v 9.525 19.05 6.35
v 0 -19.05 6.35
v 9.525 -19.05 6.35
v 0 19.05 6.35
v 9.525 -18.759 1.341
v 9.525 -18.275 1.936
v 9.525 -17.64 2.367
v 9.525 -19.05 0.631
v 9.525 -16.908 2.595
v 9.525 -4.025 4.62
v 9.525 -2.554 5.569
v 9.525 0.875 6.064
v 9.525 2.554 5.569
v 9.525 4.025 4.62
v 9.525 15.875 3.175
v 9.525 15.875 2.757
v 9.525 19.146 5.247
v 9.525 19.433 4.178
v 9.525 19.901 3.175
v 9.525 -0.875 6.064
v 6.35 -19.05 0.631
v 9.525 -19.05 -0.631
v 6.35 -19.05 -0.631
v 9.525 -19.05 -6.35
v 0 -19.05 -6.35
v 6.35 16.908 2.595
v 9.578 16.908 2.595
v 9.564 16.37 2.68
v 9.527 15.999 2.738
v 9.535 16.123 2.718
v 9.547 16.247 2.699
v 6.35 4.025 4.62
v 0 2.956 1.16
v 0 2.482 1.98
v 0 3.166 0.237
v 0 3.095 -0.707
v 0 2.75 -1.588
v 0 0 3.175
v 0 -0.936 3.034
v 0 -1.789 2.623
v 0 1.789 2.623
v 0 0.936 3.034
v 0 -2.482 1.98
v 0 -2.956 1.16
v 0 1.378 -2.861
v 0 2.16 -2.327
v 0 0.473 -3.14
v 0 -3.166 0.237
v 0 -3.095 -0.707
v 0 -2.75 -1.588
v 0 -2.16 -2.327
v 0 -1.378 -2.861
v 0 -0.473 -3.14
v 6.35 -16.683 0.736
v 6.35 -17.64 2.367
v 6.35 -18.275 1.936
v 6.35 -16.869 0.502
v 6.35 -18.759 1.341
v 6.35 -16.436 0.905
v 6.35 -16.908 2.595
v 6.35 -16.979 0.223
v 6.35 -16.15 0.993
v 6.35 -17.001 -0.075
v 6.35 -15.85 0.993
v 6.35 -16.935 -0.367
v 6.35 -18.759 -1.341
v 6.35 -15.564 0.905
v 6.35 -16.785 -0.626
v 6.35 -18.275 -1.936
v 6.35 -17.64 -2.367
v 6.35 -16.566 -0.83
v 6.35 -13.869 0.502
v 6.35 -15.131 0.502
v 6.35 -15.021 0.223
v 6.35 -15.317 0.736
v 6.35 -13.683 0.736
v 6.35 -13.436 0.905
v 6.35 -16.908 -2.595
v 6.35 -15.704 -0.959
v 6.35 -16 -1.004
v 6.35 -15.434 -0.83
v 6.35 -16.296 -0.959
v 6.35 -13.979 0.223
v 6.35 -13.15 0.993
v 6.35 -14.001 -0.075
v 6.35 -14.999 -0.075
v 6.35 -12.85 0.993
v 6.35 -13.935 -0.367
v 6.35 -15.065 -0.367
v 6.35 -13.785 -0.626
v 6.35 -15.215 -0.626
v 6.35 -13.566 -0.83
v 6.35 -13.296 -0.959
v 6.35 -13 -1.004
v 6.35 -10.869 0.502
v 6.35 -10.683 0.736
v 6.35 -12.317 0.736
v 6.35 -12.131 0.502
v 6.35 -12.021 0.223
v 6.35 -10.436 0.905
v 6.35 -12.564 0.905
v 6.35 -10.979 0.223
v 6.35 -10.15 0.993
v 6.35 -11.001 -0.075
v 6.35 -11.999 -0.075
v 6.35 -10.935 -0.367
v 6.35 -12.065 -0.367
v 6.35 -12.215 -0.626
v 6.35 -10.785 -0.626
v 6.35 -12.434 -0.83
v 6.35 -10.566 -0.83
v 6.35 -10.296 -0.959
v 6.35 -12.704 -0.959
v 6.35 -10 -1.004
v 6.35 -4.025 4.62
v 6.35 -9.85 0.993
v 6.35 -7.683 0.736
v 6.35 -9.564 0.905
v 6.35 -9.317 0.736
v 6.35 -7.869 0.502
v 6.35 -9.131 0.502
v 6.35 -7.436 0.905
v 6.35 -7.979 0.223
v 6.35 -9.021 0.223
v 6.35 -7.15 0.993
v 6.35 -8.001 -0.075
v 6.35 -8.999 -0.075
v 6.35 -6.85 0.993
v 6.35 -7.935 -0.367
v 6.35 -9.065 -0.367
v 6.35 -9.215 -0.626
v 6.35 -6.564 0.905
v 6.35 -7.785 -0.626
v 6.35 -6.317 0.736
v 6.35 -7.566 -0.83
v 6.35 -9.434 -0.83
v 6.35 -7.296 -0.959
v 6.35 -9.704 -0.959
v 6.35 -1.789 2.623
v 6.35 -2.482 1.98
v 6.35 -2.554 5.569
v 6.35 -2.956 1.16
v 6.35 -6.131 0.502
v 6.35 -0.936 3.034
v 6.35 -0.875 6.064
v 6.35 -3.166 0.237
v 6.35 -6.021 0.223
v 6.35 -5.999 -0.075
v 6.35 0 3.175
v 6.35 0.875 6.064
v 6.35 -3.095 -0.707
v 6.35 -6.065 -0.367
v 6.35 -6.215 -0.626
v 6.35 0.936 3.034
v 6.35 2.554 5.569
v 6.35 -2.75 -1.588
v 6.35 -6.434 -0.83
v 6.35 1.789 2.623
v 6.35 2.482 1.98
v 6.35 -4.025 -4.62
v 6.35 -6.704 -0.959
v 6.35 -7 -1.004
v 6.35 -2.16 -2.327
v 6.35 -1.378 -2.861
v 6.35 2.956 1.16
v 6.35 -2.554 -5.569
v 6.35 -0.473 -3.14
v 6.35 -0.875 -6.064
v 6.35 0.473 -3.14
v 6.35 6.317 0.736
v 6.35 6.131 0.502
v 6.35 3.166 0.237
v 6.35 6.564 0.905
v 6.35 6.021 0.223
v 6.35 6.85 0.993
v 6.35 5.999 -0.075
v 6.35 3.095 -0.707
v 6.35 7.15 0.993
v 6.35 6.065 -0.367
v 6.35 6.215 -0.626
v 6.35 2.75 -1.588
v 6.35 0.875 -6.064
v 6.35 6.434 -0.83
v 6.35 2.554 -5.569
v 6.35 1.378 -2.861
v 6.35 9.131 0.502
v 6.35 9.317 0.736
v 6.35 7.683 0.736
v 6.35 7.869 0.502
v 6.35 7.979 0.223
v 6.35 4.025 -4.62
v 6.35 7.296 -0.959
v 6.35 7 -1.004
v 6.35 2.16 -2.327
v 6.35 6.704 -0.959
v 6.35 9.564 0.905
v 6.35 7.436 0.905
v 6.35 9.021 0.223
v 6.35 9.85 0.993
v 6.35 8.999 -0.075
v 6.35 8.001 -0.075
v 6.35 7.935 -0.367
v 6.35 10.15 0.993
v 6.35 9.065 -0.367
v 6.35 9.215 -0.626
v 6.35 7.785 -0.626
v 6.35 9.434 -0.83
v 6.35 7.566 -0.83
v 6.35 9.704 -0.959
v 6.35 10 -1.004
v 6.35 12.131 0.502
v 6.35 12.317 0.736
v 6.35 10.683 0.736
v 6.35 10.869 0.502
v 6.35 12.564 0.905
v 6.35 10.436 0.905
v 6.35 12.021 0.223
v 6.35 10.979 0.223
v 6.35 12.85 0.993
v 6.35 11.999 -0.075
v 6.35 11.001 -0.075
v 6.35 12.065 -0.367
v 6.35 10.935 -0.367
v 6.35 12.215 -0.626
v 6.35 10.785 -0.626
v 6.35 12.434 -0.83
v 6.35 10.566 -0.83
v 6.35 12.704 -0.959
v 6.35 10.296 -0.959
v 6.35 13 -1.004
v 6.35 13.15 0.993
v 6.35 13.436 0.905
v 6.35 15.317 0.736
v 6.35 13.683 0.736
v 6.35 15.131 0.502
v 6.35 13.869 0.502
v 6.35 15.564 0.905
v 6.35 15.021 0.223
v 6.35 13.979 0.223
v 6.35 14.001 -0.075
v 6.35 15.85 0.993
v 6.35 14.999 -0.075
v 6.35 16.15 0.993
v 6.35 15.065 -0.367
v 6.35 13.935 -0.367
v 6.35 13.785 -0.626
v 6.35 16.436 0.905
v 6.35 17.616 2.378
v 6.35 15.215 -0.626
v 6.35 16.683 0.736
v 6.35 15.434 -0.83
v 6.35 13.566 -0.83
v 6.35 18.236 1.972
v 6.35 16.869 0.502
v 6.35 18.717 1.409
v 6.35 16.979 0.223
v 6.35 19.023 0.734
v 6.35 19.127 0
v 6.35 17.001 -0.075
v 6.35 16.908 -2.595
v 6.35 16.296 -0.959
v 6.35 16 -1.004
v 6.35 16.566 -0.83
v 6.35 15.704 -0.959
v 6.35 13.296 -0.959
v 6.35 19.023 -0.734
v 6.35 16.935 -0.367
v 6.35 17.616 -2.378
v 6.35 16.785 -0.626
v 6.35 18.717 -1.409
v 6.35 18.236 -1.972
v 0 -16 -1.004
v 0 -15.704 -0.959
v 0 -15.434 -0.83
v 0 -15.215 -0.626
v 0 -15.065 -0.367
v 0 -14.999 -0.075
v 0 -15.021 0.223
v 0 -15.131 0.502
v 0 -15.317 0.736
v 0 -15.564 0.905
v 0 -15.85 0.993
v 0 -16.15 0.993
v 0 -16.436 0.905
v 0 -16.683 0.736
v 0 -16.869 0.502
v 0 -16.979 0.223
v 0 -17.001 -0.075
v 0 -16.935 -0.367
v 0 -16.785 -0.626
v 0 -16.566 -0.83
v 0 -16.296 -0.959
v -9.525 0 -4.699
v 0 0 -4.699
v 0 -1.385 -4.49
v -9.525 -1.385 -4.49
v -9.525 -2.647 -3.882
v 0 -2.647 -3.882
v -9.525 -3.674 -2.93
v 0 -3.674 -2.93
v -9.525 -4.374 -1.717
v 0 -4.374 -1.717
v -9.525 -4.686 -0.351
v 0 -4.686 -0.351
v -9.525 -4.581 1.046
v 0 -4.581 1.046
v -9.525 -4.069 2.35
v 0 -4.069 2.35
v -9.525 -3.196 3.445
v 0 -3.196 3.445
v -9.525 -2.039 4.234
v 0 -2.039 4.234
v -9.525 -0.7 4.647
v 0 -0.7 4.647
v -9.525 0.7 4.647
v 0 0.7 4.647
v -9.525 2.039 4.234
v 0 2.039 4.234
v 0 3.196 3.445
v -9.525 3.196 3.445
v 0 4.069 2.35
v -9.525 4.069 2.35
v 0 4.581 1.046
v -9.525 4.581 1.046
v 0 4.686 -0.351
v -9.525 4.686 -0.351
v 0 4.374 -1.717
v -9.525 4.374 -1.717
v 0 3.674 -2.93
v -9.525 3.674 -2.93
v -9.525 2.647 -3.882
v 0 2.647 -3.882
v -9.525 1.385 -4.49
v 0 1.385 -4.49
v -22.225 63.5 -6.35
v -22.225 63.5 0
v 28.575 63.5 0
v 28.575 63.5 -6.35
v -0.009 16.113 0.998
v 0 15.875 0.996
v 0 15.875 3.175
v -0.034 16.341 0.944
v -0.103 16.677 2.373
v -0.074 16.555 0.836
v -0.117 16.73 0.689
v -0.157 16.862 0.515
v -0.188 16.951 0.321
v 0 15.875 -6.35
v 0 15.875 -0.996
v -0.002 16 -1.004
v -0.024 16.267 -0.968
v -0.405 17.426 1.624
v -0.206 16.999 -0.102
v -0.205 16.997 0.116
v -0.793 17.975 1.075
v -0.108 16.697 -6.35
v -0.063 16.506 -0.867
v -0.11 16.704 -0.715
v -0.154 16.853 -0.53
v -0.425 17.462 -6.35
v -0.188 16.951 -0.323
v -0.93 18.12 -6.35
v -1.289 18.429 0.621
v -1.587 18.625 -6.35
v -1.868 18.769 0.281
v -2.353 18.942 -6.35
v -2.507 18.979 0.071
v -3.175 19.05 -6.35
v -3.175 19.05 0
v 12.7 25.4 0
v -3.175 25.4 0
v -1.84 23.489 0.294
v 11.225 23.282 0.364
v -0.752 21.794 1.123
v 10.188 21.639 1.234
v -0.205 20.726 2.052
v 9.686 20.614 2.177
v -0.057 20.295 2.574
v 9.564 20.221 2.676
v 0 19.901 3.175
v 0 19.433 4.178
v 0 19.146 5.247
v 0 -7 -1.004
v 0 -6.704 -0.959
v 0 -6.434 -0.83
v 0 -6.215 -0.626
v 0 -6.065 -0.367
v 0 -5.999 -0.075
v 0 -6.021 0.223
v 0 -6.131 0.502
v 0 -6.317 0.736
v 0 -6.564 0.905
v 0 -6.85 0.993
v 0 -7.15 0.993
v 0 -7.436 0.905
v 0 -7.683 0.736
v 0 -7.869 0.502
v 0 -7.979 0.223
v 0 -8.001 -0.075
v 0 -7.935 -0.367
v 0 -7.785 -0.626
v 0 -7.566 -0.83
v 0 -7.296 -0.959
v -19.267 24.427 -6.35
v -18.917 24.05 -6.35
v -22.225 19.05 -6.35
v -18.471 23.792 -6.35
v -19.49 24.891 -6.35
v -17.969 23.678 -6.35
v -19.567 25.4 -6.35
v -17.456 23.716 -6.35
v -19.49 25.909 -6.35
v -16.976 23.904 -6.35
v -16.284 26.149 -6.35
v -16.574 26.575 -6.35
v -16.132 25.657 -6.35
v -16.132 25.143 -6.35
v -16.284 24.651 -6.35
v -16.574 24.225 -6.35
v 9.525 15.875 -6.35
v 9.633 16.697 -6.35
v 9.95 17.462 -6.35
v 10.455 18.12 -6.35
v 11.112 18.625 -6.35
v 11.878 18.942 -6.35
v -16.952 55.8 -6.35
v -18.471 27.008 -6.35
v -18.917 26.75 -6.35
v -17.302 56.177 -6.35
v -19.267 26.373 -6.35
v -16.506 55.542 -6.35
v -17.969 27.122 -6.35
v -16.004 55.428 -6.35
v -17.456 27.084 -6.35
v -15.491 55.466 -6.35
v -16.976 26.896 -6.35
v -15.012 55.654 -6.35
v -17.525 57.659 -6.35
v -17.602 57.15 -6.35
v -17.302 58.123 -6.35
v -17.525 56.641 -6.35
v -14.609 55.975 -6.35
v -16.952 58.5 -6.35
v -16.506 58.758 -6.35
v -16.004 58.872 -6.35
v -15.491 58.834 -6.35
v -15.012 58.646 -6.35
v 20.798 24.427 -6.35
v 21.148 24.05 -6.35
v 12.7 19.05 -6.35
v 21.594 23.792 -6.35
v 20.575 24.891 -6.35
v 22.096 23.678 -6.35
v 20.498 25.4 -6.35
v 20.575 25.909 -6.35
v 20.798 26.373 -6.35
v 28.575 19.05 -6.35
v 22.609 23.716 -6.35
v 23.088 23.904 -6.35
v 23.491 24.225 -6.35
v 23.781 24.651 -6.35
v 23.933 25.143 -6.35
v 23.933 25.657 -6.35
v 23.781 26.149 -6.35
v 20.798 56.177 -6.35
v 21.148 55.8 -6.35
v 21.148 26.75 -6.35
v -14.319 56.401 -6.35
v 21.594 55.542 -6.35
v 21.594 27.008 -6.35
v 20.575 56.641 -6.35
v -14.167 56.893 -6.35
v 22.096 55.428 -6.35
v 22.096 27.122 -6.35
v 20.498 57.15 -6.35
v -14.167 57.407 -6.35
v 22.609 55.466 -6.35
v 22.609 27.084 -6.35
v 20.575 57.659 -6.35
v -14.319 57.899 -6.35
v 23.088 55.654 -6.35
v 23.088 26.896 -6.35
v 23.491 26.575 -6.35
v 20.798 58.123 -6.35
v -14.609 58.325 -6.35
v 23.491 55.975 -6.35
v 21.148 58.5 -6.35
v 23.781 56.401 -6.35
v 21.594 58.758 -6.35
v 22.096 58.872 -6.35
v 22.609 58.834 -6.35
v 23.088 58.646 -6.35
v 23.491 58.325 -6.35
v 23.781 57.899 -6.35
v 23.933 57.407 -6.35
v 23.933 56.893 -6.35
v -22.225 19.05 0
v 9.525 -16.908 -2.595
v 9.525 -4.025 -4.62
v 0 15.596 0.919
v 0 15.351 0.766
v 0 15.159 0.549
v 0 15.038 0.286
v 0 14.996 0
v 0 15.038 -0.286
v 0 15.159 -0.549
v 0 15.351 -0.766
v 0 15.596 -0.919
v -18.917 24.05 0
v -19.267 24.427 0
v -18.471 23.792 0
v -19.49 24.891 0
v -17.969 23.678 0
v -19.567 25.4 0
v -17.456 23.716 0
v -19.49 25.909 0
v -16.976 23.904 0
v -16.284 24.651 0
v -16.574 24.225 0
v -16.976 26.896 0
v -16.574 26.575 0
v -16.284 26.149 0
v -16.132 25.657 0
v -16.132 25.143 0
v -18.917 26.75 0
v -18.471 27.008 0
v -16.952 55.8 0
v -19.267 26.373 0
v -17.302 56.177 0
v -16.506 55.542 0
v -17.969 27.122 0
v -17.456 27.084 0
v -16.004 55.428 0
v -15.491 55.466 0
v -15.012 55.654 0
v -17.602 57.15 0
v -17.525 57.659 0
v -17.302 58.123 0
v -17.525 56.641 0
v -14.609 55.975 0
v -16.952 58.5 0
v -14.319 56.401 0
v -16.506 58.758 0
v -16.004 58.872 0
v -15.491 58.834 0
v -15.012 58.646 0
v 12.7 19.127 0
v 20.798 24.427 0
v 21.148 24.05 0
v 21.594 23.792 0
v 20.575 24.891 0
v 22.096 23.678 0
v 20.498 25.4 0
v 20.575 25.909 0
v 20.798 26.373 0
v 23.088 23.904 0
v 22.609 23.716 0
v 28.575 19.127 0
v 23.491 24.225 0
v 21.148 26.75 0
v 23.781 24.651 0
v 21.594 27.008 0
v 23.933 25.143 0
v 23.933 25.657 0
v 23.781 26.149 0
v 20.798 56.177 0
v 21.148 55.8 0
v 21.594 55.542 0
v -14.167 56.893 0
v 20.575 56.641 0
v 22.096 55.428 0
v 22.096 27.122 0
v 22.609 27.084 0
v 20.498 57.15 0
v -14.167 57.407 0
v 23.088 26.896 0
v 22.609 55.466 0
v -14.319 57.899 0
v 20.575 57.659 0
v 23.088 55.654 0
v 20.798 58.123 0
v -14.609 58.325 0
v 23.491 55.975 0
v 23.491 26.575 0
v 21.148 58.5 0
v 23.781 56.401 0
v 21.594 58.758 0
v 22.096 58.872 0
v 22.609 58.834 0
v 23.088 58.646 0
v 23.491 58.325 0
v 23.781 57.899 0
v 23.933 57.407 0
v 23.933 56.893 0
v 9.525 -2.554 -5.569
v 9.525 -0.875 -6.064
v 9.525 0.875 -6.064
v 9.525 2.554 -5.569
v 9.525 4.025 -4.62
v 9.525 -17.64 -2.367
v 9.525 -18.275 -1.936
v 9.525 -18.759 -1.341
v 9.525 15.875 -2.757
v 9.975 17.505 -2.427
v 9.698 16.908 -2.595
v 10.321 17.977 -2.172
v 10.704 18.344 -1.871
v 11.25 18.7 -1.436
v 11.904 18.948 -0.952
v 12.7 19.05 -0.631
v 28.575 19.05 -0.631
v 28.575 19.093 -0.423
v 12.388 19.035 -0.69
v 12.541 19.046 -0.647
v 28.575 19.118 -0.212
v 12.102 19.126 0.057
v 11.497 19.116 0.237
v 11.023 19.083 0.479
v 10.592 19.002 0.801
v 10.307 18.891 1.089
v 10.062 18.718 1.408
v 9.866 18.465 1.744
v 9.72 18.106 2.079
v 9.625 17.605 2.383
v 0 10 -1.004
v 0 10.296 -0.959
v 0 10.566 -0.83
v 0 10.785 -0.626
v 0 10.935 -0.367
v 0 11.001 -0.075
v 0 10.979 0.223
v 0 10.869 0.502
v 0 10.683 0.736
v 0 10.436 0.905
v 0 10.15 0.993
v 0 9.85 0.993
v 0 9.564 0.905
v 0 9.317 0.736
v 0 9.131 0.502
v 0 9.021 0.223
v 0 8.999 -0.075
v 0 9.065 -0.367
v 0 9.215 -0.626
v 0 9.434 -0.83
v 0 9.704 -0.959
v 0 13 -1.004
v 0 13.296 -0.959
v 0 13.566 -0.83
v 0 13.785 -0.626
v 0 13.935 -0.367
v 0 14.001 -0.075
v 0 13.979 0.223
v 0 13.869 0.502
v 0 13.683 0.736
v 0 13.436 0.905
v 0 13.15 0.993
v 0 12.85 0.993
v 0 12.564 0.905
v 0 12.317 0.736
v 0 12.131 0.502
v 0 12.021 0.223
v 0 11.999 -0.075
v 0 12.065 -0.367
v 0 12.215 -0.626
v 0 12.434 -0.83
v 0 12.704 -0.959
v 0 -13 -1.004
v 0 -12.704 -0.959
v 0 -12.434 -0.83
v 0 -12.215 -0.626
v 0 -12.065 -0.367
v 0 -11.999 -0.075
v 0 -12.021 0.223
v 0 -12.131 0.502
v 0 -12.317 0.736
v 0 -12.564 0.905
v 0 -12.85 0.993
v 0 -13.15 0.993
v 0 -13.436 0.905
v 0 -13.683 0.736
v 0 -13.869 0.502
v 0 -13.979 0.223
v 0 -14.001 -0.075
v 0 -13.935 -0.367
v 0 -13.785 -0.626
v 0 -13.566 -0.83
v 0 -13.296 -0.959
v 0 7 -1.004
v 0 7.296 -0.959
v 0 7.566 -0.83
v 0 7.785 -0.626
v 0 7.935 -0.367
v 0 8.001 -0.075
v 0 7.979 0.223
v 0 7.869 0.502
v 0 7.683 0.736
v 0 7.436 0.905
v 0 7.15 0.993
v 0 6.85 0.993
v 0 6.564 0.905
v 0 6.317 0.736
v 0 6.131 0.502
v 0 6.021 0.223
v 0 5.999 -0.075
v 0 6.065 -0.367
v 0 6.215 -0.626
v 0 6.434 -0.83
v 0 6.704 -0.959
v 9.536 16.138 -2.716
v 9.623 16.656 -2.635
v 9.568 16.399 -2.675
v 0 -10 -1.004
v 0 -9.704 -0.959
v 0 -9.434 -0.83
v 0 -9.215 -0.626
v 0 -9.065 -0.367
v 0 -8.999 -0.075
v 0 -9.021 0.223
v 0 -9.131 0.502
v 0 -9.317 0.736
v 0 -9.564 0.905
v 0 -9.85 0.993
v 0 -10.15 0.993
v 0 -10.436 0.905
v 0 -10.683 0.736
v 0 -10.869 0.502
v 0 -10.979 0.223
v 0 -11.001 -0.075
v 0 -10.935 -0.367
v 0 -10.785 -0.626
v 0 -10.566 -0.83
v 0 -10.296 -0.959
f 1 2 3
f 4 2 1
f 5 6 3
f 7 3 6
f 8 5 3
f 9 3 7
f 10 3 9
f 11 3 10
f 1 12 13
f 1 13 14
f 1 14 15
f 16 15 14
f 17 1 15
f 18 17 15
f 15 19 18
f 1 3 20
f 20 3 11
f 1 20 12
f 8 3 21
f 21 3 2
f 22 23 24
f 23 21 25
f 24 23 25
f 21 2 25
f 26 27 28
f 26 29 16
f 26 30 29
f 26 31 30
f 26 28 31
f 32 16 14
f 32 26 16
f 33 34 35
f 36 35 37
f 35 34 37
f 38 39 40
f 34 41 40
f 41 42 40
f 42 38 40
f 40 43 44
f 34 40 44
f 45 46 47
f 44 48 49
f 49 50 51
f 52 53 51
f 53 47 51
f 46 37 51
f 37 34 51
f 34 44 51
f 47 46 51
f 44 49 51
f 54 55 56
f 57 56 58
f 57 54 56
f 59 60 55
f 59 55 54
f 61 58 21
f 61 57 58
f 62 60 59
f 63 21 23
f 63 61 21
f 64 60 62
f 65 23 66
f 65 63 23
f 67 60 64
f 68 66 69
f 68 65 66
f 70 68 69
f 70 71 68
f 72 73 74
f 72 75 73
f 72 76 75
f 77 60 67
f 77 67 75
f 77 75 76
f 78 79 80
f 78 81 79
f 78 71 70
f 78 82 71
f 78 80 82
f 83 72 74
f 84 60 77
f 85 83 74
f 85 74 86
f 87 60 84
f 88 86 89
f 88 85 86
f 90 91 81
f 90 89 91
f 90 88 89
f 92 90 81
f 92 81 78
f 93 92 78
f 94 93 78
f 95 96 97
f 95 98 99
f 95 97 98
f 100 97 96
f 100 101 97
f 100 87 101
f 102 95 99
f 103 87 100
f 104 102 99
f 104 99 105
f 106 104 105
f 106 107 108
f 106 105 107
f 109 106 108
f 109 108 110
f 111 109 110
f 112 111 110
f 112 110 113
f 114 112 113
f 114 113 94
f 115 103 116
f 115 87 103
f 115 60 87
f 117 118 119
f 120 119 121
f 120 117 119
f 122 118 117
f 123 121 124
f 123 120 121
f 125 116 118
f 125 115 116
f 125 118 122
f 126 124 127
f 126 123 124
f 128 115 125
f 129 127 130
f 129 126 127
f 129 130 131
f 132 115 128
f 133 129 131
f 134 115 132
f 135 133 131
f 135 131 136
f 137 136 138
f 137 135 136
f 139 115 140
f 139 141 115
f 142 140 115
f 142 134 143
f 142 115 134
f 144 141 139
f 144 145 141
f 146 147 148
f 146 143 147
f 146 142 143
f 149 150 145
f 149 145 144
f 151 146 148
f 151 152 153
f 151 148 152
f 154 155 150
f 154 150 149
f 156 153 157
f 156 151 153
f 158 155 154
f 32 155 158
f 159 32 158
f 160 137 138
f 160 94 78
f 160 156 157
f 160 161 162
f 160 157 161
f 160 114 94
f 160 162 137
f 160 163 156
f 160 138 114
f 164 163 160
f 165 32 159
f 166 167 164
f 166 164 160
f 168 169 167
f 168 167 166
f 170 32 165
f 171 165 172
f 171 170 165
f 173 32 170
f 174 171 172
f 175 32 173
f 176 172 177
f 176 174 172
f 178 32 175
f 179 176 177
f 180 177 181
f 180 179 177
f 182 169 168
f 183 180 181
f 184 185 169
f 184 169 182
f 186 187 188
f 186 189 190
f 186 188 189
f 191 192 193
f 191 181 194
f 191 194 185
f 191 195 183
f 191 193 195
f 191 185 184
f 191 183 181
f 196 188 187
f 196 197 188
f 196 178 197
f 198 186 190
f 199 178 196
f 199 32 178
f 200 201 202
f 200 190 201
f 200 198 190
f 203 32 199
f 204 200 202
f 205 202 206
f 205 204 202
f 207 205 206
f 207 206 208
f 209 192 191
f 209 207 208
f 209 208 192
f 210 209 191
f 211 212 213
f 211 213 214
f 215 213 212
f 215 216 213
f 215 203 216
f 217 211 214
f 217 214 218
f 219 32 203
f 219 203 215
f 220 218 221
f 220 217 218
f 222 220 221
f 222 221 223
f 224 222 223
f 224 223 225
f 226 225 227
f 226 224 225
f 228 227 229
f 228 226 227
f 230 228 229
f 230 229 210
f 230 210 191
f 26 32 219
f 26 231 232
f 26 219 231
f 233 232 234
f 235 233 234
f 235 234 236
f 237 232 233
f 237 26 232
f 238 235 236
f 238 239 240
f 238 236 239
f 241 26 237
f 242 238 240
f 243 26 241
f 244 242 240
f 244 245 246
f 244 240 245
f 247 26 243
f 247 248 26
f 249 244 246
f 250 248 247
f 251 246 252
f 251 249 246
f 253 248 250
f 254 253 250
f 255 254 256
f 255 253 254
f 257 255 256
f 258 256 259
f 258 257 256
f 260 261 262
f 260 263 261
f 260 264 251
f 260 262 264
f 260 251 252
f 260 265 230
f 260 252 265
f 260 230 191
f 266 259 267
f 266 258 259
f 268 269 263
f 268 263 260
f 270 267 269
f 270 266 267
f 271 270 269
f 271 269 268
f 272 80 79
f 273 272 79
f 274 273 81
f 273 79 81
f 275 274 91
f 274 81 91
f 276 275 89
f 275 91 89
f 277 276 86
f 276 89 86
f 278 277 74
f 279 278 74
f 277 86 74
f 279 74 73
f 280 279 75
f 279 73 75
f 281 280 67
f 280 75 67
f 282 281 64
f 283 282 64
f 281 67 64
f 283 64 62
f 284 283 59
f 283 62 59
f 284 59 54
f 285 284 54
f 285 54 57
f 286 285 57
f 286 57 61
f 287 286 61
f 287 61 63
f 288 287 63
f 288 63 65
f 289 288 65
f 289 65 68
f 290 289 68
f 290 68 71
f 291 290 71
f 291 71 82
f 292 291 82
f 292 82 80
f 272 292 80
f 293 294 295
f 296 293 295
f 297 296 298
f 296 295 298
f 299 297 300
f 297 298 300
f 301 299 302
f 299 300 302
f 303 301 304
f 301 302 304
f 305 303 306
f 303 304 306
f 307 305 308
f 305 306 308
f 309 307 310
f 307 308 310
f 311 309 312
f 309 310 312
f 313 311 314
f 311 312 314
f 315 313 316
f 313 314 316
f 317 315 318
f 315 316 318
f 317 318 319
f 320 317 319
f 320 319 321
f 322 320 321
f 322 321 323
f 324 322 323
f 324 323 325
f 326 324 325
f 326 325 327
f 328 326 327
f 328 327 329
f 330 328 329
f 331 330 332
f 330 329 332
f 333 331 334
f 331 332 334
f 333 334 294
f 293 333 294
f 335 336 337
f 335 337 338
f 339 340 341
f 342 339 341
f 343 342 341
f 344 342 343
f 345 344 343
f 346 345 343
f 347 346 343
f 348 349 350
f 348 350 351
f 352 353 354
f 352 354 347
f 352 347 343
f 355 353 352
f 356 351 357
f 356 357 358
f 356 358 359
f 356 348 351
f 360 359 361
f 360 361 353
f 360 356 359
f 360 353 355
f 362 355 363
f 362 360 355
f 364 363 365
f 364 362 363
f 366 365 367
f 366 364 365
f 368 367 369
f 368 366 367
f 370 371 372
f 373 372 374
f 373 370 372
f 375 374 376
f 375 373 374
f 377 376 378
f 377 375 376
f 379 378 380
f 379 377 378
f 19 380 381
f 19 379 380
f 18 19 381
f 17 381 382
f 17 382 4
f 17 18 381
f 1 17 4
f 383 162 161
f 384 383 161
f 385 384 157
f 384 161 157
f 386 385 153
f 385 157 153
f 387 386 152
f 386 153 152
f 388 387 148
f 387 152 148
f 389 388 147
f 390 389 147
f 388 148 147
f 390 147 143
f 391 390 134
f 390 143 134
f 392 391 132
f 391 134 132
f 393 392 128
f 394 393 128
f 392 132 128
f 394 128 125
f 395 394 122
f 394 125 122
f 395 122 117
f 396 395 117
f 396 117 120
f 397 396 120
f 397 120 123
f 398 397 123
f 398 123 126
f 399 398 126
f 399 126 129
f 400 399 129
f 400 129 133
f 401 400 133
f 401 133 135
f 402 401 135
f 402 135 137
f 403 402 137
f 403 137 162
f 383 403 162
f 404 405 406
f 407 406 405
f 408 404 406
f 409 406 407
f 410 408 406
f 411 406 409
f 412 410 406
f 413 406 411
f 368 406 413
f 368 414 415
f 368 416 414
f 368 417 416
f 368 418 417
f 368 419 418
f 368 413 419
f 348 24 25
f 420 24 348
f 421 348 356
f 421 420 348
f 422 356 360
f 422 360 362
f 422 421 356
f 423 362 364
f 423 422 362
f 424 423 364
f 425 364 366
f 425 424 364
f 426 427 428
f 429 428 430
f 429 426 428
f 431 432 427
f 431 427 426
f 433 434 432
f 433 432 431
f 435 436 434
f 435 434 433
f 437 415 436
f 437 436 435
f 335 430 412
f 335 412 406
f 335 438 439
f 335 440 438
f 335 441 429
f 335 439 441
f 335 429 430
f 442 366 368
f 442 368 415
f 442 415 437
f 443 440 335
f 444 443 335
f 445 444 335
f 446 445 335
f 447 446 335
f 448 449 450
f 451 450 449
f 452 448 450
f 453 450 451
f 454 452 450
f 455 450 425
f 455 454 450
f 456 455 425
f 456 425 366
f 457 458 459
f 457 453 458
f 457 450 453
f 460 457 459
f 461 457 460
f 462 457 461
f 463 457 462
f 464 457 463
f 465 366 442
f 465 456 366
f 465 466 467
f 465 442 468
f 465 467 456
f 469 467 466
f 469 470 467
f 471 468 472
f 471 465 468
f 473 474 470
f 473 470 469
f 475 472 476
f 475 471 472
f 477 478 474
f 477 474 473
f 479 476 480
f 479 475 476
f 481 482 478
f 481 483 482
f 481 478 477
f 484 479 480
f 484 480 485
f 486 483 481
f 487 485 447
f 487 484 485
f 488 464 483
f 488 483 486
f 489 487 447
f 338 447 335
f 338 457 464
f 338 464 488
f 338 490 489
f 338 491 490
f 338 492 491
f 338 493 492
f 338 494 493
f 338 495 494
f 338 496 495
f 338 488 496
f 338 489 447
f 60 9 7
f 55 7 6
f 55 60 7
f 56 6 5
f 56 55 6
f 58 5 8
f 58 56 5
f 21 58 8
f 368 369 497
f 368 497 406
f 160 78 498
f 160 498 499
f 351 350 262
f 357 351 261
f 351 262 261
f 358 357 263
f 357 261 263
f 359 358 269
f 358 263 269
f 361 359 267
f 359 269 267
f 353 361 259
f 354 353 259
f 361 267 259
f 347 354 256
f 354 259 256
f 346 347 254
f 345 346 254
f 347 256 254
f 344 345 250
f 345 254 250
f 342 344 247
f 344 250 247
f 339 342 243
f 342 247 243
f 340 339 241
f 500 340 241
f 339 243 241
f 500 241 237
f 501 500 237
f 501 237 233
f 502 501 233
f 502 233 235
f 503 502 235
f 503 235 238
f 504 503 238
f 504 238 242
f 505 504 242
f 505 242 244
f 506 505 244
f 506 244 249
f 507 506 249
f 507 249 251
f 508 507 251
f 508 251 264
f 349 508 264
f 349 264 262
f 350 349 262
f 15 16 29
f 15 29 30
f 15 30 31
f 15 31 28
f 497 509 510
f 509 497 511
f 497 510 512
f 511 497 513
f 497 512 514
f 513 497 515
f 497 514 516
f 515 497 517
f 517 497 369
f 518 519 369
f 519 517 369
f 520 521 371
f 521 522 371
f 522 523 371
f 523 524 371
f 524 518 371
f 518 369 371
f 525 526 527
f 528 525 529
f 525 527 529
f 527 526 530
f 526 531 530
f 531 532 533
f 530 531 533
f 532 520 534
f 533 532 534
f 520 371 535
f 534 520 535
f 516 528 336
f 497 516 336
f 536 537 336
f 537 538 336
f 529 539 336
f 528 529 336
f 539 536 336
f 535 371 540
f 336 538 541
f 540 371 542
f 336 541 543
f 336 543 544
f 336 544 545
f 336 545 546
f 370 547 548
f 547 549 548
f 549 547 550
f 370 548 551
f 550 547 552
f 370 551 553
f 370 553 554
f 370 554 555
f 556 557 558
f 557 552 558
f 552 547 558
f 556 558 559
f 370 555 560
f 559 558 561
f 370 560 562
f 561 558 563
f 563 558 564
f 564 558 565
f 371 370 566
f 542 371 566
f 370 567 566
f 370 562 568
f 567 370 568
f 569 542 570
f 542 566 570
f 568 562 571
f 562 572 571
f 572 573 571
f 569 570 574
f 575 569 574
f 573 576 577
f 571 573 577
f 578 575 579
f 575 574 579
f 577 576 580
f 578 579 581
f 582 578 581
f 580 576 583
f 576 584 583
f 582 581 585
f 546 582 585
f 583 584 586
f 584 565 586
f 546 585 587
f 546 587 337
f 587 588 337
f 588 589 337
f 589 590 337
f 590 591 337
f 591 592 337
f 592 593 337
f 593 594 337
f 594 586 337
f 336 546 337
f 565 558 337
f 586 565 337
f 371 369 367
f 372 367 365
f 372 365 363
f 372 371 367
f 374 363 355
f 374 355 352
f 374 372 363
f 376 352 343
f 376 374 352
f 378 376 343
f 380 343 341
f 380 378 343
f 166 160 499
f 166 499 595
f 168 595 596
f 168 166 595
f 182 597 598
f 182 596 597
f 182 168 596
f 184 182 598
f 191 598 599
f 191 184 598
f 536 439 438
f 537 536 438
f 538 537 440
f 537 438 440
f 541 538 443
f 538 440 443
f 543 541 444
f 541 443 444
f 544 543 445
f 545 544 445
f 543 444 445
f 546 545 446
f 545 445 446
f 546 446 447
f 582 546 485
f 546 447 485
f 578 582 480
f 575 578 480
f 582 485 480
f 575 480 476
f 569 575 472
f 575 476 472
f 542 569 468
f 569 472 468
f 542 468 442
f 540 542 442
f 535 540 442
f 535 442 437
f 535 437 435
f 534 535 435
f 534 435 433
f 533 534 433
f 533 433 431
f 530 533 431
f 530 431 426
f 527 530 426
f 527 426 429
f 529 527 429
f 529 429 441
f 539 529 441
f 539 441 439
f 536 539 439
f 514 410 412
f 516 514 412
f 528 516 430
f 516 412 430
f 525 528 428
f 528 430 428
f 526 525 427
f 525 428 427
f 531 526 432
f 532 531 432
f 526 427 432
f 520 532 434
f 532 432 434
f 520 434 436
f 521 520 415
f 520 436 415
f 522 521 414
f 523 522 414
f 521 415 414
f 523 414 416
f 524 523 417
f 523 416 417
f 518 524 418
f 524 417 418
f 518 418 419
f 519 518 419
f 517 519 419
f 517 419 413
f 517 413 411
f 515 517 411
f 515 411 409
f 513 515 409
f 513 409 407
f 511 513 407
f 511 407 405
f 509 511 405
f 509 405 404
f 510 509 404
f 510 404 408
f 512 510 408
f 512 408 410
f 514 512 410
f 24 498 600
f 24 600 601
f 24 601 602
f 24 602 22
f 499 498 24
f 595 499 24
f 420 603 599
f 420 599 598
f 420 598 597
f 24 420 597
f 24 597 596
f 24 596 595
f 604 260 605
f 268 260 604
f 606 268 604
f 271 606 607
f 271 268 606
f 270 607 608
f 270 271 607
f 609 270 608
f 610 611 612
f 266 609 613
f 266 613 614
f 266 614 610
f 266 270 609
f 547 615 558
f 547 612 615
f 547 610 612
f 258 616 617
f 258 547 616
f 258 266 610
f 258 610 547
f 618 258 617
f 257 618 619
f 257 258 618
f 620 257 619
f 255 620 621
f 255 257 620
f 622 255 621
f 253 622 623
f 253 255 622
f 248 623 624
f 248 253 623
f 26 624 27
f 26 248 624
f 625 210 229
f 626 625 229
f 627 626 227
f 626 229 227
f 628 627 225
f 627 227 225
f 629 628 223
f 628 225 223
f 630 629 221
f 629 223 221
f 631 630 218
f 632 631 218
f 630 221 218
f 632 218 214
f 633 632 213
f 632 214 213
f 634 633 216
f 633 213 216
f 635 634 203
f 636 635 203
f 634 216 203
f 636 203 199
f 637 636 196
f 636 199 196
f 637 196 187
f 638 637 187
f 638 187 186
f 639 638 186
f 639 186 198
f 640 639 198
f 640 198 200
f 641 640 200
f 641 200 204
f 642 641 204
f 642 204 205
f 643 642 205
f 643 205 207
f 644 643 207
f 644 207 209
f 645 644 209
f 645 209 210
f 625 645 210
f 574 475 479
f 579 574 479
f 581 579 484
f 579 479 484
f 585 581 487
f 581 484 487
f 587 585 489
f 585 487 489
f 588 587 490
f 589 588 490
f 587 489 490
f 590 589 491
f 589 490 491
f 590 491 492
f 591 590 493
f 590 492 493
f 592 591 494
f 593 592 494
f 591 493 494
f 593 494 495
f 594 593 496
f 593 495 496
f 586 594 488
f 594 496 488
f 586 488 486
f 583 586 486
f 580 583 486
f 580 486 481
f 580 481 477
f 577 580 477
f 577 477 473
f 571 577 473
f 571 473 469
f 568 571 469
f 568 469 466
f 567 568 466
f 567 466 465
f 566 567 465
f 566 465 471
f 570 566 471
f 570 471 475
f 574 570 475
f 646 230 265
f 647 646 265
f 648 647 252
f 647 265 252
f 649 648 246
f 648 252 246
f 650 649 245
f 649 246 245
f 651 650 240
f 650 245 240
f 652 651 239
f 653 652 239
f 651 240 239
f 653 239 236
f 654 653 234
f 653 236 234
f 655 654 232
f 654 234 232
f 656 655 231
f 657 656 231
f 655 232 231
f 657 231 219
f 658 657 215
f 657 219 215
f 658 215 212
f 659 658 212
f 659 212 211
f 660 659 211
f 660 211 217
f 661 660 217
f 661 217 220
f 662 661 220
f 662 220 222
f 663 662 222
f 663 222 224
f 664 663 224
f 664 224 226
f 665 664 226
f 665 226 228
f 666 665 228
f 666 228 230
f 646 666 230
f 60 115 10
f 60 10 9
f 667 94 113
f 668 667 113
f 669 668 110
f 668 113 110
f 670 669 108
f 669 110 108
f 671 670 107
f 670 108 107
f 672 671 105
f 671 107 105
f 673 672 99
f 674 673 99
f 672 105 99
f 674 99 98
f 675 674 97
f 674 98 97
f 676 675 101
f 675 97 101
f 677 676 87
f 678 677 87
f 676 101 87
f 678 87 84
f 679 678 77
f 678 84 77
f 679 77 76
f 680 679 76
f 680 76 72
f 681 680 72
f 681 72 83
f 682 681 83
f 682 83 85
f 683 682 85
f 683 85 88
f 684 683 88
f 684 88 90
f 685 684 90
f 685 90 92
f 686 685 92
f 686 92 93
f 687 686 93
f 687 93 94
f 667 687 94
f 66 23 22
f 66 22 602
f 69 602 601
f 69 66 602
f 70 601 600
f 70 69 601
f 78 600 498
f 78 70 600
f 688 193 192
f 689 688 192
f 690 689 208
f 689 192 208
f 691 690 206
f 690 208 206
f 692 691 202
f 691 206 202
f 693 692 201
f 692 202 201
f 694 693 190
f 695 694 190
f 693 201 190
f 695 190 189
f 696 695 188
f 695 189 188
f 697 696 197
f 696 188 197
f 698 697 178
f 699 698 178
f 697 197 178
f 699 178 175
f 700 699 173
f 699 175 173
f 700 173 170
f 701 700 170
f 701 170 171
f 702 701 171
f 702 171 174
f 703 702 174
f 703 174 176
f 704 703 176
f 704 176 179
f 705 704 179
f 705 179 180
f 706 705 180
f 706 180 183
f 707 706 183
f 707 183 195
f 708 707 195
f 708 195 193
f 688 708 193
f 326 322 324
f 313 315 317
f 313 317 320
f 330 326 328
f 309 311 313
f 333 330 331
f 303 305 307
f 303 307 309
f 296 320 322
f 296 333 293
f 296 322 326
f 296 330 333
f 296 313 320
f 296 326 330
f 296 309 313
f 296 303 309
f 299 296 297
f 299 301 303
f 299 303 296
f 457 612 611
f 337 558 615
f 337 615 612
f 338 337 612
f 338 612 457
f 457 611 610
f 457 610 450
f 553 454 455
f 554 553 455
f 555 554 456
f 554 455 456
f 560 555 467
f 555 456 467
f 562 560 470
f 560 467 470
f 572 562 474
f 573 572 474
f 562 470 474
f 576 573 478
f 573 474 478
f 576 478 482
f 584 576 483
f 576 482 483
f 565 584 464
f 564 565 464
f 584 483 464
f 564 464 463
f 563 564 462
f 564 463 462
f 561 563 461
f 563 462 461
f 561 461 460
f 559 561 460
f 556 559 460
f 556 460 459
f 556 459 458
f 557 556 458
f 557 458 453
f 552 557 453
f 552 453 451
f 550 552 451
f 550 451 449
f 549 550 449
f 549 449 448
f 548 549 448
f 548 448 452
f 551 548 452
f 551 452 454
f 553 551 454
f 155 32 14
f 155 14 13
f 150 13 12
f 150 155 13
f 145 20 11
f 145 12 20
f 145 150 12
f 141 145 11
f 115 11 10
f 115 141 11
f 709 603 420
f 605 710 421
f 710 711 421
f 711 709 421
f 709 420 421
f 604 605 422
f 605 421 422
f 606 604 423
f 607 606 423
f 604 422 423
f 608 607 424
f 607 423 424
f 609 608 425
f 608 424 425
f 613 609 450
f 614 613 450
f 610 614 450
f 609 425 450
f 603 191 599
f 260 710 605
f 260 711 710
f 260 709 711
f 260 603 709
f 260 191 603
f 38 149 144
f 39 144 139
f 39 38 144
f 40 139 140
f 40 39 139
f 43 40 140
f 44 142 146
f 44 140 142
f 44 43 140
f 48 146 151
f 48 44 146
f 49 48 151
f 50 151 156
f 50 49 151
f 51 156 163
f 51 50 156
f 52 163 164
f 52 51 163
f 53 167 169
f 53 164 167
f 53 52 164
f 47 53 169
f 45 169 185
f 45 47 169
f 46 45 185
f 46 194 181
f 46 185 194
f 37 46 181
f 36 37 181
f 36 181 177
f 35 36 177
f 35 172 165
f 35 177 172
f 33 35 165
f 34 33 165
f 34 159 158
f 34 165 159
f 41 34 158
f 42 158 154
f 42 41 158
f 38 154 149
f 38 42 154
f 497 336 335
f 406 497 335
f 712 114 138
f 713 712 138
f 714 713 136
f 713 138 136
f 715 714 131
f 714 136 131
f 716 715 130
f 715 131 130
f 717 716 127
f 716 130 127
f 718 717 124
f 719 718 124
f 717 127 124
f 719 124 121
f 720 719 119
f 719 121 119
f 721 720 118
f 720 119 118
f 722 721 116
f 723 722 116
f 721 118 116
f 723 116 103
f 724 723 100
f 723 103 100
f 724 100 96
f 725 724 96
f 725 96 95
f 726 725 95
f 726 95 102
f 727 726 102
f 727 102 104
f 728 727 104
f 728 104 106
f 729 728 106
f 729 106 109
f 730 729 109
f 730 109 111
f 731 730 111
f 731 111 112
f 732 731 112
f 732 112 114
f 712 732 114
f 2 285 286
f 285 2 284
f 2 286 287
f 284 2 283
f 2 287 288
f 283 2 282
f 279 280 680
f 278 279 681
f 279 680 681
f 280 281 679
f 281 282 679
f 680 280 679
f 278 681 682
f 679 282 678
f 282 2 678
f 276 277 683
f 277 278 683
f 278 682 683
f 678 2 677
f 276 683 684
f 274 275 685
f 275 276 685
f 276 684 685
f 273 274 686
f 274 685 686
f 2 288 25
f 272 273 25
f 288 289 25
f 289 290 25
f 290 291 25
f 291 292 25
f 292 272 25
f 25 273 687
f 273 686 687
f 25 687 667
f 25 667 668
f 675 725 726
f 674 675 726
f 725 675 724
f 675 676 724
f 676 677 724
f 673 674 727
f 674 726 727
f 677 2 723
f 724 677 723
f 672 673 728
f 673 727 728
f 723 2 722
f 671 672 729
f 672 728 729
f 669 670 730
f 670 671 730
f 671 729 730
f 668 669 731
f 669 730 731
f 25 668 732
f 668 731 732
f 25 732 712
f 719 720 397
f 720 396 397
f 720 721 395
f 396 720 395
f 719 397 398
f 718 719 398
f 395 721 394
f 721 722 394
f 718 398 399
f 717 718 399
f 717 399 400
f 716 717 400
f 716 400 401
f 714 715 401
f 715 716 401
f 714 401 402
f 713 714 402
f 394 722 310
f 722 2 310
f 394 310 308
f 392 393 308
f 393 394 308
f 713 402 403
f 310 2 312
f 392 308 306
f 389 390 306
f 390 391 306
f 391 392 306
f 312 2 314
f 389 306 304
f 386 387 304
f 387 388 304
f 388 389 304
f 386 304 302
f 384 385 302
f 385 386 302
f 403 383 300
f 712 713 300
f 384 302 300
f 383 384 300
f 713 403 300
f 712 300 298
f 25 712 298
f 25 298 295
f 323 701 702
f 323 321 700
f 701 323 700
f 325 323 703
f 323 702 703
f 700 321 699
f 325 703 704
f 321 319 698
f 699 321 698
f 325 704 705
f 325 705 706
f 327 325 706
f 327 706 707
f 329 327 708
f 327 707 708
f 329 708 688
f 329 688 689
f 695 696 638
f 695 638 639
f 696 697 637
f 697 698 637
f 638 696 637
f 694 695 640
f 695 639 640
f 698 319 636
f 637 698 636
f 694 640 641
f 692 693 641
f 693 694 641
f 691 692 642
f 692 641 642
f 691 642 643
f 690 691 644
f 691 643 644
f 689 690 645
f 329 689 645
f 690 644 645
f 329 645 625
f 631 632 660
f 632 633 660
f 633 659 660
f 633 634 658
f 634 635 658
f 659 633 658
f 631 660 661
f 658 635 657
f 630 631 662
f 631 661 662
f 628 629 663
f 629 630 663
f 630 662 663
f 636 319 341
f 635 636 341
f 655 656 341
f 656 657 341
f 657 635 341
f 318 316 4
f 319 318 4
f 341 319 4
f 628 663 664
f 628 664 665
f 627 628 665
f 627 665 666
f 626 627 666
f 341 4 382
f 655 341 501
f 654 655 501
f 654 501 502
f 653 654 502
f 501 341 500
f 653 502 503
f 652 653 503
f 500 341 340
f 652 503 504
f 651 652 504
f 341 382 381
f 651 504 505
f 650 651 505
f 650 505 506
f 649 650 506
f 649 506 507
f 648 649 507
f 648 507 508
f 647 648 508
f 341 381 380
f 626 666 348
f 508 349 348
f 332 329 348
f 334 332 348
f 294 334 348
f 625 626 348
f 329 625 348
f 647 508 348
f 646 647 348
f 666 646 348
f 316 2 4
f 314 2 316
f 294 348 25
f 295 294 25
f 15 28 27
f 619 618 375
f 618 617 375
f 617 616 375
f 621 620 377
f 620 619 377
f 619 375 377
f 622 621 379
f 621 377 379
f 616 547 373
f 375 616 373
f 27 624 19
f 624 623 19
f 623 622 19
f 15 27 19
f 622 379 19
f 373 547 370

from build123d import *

# Parameters (mm, degrees)
SKETCH2_W               = 12.7
SKETCH2_H               = 38.1
SKETCH2_R               = 3.175
BOSS_EXTRUDE1_DEPTH     = 9.525
SKETCH3_R               = 4.699
BOSS_EXTRUDE2_DEPTH     = 9.525
SKETCH6_W               = 6.35
SKETCH6_H               = 44.45
BOSS_EXTRUDE3_DEPTH     = 25.4
FILLET1_R               = 6.35
FILLET4_R               = 3.175
CUT_EXTRUDE1_DEPTH      = 72.278573361
CUT_EXTRUDE1_DEPTH_BACK = 3.175
SKETCH8_R               = 1.004
CUT_EXTRUDE2_DEPTH      = 72.278573361
SKETCH9_R               = 1.726999975
CUT_EXTRUDE3_DEPTH      = 71.781852519


with BuildPart() as part:
    # Sketch2 → Boss-Extrude1 (new body)
    with BuildSketch(Plane(origin=(0, 0, 0), x_dir=(0, 0, -1), z_dir=(1, 0, 0))):
        Rectangle(SKETCH2_W, SKETCH2_H)
        with Locations(Location((0, 0, 0), (0, 0, 180))):
            Circle(SKETCH2_R, mode=Mode.SUBTRACT)
    extrude(amount=BOSS_EXTRUDE1_DEPTH)

    # Sketch3 → Boss-Extrude2 (add)
    with BuildSketch(Plane.ZY):
        with Locations(Location((0, 0, 0), (0, 0, 180))):
            Circle(SKETCH3_R)
    extrude(amount=BOSS_EXTRUDE2_DEPTH)

    # Sketch6 → Boss-Extrude3 (add, symmetric)
    with BuildSketch(Plane(origin=(3.175, 0, 0), x_dir=(0, 0, -1), z_dir=(1, 0, 0))):
        with Locations((3.175, 41.275)):
            Rectangle(SKETCH6_W, SKETCH6_H)
    extrude(amount=BOSS_EXTRUDE3_DEPTH, both=True)

    # Fillet1
    fillet1_edges = [part.edges().sort_by_distance(p)[0] for p in [
        (4.7625, 19.05, 0),
    ]]
    fillet(fillet1_edges, radius=FILLET1_R - 0.0001)  # a hair under: the kernel refuses the full size

    # Fillet4
    fillet4_edges = [part.edges().sort_by_distance(p)[0] for p in [
        (9.525, 22.22495, 0),
        (0, 22.22495, 0),
        (0, 19.05, -3.175),
        (9.525, 19.05, -3.175),
    ]]
    fillet(fillet4_edges, radius=FILLET4_R)

    # Sketch7 → Cut-Extrude1 (cut, two sides: drawn at the far end of the back side and taken through both)
    with BuildSketch(Plane(origin=(9.525, 0, 0), x_dir=(0, 0, -1), z_dir=(1, 0, 0)).offset(-CUT_EXTRUDE1_DEPTH_BACK)):
        with BuildLine():
            Line((2.595150061, -16.907830377), (4.619750173, -4.024678621))
            ThreePointArc((4.619750173, -4.024678621), (6.127000091, 2.2e-08), (4.619750173, 4.024678665))
            Line((4.619750173, 4.024678665), (2.595150061, 16.907830421))
            ThreePointArc((2.595150061, 16.907830421), (9.1e-08, 19.127000022), (-2.595149879, 16.907830421))
            Line((-2.595149879, 16.907830421), (-4.619749991, 4.024678665))
            ThreePointArc((-4.619749991, 4.024678665), (-6.126999909, 2.2e-08), (-4.619749991, -4.024678621))
            Line((-4.619749991, -4.024678621), (-2.595149879, -16.907830377))
            ThreePointArc((-2.595149879, -16.907830377), (9.1e-08, -19.126999978), (2.595150061, -16.907830377))
        make_face()
    extrude(amount=CUT_EXTRUDE1_DEPTH + CUT_EXTRUDE1_DEPTH_BACK, mode=Mode.SUBTRACT)

    # Sketch8 → Cut-Extrude2 (cut, through all)
    with BuildSketch(Plane(origin=(9.525, 0, 0), x_dir=(0, 0, -1), z_dir=(1, 0, 0))):
        with Locations((9.1e-08, -15.999999978)):
            Circle(SKETCH8_R)
        with Locations((9.1e-08, -12.999999978)):
            Circle(SKETCH8_R)
        with Locations((9.1e-08, -9.999999978)):
            Circle(SKETCH8_R)
        with Locations((9.1e-08, -6.999999978)):
            Circle(SKETCH8_R)
        with Locations((9.1e-08, 16.000000022)):
            Circle(SKETCH8_R)
        with Locations((9.1e-08, 13.000000022)):
            Circle(SKETCH8_R)
        with Locations((9.1e-08, 10.000000022)):
            Circle(SKETCH8_R)
        with Locations((9.1e-08, 7.000000022)):
            Circle(SKETCH8_R)
    extrude(amount=-CUT_EXTRUDE2_DEPTH, mode=Mode.SUBTRACT)

    # Sketch9 → Cut-Extrude3 (cut, through all)
    with BuildSketch(Plane(origin=(0, 0, -6.35), x_dir=(-1, 0, 0), z_dir=(0, 0, -1))):
        with Locations((-22.225, 57.15)):
            Circle(SKETCH9_R)
        with Locations((15.875, 57.15)):
            Circle(SKETCH9_R)
        with Locations((17.839802872, 25.4)):
            Circle(SKETCH9_R)
        with Locations((-22.225, 25.4)):
            Circle(SKETCH9_R)
    extrude(amount=-CUT_EXTRUDE3_DEPTH, mode=Mode.SUBTRACT)


solid = part.part
